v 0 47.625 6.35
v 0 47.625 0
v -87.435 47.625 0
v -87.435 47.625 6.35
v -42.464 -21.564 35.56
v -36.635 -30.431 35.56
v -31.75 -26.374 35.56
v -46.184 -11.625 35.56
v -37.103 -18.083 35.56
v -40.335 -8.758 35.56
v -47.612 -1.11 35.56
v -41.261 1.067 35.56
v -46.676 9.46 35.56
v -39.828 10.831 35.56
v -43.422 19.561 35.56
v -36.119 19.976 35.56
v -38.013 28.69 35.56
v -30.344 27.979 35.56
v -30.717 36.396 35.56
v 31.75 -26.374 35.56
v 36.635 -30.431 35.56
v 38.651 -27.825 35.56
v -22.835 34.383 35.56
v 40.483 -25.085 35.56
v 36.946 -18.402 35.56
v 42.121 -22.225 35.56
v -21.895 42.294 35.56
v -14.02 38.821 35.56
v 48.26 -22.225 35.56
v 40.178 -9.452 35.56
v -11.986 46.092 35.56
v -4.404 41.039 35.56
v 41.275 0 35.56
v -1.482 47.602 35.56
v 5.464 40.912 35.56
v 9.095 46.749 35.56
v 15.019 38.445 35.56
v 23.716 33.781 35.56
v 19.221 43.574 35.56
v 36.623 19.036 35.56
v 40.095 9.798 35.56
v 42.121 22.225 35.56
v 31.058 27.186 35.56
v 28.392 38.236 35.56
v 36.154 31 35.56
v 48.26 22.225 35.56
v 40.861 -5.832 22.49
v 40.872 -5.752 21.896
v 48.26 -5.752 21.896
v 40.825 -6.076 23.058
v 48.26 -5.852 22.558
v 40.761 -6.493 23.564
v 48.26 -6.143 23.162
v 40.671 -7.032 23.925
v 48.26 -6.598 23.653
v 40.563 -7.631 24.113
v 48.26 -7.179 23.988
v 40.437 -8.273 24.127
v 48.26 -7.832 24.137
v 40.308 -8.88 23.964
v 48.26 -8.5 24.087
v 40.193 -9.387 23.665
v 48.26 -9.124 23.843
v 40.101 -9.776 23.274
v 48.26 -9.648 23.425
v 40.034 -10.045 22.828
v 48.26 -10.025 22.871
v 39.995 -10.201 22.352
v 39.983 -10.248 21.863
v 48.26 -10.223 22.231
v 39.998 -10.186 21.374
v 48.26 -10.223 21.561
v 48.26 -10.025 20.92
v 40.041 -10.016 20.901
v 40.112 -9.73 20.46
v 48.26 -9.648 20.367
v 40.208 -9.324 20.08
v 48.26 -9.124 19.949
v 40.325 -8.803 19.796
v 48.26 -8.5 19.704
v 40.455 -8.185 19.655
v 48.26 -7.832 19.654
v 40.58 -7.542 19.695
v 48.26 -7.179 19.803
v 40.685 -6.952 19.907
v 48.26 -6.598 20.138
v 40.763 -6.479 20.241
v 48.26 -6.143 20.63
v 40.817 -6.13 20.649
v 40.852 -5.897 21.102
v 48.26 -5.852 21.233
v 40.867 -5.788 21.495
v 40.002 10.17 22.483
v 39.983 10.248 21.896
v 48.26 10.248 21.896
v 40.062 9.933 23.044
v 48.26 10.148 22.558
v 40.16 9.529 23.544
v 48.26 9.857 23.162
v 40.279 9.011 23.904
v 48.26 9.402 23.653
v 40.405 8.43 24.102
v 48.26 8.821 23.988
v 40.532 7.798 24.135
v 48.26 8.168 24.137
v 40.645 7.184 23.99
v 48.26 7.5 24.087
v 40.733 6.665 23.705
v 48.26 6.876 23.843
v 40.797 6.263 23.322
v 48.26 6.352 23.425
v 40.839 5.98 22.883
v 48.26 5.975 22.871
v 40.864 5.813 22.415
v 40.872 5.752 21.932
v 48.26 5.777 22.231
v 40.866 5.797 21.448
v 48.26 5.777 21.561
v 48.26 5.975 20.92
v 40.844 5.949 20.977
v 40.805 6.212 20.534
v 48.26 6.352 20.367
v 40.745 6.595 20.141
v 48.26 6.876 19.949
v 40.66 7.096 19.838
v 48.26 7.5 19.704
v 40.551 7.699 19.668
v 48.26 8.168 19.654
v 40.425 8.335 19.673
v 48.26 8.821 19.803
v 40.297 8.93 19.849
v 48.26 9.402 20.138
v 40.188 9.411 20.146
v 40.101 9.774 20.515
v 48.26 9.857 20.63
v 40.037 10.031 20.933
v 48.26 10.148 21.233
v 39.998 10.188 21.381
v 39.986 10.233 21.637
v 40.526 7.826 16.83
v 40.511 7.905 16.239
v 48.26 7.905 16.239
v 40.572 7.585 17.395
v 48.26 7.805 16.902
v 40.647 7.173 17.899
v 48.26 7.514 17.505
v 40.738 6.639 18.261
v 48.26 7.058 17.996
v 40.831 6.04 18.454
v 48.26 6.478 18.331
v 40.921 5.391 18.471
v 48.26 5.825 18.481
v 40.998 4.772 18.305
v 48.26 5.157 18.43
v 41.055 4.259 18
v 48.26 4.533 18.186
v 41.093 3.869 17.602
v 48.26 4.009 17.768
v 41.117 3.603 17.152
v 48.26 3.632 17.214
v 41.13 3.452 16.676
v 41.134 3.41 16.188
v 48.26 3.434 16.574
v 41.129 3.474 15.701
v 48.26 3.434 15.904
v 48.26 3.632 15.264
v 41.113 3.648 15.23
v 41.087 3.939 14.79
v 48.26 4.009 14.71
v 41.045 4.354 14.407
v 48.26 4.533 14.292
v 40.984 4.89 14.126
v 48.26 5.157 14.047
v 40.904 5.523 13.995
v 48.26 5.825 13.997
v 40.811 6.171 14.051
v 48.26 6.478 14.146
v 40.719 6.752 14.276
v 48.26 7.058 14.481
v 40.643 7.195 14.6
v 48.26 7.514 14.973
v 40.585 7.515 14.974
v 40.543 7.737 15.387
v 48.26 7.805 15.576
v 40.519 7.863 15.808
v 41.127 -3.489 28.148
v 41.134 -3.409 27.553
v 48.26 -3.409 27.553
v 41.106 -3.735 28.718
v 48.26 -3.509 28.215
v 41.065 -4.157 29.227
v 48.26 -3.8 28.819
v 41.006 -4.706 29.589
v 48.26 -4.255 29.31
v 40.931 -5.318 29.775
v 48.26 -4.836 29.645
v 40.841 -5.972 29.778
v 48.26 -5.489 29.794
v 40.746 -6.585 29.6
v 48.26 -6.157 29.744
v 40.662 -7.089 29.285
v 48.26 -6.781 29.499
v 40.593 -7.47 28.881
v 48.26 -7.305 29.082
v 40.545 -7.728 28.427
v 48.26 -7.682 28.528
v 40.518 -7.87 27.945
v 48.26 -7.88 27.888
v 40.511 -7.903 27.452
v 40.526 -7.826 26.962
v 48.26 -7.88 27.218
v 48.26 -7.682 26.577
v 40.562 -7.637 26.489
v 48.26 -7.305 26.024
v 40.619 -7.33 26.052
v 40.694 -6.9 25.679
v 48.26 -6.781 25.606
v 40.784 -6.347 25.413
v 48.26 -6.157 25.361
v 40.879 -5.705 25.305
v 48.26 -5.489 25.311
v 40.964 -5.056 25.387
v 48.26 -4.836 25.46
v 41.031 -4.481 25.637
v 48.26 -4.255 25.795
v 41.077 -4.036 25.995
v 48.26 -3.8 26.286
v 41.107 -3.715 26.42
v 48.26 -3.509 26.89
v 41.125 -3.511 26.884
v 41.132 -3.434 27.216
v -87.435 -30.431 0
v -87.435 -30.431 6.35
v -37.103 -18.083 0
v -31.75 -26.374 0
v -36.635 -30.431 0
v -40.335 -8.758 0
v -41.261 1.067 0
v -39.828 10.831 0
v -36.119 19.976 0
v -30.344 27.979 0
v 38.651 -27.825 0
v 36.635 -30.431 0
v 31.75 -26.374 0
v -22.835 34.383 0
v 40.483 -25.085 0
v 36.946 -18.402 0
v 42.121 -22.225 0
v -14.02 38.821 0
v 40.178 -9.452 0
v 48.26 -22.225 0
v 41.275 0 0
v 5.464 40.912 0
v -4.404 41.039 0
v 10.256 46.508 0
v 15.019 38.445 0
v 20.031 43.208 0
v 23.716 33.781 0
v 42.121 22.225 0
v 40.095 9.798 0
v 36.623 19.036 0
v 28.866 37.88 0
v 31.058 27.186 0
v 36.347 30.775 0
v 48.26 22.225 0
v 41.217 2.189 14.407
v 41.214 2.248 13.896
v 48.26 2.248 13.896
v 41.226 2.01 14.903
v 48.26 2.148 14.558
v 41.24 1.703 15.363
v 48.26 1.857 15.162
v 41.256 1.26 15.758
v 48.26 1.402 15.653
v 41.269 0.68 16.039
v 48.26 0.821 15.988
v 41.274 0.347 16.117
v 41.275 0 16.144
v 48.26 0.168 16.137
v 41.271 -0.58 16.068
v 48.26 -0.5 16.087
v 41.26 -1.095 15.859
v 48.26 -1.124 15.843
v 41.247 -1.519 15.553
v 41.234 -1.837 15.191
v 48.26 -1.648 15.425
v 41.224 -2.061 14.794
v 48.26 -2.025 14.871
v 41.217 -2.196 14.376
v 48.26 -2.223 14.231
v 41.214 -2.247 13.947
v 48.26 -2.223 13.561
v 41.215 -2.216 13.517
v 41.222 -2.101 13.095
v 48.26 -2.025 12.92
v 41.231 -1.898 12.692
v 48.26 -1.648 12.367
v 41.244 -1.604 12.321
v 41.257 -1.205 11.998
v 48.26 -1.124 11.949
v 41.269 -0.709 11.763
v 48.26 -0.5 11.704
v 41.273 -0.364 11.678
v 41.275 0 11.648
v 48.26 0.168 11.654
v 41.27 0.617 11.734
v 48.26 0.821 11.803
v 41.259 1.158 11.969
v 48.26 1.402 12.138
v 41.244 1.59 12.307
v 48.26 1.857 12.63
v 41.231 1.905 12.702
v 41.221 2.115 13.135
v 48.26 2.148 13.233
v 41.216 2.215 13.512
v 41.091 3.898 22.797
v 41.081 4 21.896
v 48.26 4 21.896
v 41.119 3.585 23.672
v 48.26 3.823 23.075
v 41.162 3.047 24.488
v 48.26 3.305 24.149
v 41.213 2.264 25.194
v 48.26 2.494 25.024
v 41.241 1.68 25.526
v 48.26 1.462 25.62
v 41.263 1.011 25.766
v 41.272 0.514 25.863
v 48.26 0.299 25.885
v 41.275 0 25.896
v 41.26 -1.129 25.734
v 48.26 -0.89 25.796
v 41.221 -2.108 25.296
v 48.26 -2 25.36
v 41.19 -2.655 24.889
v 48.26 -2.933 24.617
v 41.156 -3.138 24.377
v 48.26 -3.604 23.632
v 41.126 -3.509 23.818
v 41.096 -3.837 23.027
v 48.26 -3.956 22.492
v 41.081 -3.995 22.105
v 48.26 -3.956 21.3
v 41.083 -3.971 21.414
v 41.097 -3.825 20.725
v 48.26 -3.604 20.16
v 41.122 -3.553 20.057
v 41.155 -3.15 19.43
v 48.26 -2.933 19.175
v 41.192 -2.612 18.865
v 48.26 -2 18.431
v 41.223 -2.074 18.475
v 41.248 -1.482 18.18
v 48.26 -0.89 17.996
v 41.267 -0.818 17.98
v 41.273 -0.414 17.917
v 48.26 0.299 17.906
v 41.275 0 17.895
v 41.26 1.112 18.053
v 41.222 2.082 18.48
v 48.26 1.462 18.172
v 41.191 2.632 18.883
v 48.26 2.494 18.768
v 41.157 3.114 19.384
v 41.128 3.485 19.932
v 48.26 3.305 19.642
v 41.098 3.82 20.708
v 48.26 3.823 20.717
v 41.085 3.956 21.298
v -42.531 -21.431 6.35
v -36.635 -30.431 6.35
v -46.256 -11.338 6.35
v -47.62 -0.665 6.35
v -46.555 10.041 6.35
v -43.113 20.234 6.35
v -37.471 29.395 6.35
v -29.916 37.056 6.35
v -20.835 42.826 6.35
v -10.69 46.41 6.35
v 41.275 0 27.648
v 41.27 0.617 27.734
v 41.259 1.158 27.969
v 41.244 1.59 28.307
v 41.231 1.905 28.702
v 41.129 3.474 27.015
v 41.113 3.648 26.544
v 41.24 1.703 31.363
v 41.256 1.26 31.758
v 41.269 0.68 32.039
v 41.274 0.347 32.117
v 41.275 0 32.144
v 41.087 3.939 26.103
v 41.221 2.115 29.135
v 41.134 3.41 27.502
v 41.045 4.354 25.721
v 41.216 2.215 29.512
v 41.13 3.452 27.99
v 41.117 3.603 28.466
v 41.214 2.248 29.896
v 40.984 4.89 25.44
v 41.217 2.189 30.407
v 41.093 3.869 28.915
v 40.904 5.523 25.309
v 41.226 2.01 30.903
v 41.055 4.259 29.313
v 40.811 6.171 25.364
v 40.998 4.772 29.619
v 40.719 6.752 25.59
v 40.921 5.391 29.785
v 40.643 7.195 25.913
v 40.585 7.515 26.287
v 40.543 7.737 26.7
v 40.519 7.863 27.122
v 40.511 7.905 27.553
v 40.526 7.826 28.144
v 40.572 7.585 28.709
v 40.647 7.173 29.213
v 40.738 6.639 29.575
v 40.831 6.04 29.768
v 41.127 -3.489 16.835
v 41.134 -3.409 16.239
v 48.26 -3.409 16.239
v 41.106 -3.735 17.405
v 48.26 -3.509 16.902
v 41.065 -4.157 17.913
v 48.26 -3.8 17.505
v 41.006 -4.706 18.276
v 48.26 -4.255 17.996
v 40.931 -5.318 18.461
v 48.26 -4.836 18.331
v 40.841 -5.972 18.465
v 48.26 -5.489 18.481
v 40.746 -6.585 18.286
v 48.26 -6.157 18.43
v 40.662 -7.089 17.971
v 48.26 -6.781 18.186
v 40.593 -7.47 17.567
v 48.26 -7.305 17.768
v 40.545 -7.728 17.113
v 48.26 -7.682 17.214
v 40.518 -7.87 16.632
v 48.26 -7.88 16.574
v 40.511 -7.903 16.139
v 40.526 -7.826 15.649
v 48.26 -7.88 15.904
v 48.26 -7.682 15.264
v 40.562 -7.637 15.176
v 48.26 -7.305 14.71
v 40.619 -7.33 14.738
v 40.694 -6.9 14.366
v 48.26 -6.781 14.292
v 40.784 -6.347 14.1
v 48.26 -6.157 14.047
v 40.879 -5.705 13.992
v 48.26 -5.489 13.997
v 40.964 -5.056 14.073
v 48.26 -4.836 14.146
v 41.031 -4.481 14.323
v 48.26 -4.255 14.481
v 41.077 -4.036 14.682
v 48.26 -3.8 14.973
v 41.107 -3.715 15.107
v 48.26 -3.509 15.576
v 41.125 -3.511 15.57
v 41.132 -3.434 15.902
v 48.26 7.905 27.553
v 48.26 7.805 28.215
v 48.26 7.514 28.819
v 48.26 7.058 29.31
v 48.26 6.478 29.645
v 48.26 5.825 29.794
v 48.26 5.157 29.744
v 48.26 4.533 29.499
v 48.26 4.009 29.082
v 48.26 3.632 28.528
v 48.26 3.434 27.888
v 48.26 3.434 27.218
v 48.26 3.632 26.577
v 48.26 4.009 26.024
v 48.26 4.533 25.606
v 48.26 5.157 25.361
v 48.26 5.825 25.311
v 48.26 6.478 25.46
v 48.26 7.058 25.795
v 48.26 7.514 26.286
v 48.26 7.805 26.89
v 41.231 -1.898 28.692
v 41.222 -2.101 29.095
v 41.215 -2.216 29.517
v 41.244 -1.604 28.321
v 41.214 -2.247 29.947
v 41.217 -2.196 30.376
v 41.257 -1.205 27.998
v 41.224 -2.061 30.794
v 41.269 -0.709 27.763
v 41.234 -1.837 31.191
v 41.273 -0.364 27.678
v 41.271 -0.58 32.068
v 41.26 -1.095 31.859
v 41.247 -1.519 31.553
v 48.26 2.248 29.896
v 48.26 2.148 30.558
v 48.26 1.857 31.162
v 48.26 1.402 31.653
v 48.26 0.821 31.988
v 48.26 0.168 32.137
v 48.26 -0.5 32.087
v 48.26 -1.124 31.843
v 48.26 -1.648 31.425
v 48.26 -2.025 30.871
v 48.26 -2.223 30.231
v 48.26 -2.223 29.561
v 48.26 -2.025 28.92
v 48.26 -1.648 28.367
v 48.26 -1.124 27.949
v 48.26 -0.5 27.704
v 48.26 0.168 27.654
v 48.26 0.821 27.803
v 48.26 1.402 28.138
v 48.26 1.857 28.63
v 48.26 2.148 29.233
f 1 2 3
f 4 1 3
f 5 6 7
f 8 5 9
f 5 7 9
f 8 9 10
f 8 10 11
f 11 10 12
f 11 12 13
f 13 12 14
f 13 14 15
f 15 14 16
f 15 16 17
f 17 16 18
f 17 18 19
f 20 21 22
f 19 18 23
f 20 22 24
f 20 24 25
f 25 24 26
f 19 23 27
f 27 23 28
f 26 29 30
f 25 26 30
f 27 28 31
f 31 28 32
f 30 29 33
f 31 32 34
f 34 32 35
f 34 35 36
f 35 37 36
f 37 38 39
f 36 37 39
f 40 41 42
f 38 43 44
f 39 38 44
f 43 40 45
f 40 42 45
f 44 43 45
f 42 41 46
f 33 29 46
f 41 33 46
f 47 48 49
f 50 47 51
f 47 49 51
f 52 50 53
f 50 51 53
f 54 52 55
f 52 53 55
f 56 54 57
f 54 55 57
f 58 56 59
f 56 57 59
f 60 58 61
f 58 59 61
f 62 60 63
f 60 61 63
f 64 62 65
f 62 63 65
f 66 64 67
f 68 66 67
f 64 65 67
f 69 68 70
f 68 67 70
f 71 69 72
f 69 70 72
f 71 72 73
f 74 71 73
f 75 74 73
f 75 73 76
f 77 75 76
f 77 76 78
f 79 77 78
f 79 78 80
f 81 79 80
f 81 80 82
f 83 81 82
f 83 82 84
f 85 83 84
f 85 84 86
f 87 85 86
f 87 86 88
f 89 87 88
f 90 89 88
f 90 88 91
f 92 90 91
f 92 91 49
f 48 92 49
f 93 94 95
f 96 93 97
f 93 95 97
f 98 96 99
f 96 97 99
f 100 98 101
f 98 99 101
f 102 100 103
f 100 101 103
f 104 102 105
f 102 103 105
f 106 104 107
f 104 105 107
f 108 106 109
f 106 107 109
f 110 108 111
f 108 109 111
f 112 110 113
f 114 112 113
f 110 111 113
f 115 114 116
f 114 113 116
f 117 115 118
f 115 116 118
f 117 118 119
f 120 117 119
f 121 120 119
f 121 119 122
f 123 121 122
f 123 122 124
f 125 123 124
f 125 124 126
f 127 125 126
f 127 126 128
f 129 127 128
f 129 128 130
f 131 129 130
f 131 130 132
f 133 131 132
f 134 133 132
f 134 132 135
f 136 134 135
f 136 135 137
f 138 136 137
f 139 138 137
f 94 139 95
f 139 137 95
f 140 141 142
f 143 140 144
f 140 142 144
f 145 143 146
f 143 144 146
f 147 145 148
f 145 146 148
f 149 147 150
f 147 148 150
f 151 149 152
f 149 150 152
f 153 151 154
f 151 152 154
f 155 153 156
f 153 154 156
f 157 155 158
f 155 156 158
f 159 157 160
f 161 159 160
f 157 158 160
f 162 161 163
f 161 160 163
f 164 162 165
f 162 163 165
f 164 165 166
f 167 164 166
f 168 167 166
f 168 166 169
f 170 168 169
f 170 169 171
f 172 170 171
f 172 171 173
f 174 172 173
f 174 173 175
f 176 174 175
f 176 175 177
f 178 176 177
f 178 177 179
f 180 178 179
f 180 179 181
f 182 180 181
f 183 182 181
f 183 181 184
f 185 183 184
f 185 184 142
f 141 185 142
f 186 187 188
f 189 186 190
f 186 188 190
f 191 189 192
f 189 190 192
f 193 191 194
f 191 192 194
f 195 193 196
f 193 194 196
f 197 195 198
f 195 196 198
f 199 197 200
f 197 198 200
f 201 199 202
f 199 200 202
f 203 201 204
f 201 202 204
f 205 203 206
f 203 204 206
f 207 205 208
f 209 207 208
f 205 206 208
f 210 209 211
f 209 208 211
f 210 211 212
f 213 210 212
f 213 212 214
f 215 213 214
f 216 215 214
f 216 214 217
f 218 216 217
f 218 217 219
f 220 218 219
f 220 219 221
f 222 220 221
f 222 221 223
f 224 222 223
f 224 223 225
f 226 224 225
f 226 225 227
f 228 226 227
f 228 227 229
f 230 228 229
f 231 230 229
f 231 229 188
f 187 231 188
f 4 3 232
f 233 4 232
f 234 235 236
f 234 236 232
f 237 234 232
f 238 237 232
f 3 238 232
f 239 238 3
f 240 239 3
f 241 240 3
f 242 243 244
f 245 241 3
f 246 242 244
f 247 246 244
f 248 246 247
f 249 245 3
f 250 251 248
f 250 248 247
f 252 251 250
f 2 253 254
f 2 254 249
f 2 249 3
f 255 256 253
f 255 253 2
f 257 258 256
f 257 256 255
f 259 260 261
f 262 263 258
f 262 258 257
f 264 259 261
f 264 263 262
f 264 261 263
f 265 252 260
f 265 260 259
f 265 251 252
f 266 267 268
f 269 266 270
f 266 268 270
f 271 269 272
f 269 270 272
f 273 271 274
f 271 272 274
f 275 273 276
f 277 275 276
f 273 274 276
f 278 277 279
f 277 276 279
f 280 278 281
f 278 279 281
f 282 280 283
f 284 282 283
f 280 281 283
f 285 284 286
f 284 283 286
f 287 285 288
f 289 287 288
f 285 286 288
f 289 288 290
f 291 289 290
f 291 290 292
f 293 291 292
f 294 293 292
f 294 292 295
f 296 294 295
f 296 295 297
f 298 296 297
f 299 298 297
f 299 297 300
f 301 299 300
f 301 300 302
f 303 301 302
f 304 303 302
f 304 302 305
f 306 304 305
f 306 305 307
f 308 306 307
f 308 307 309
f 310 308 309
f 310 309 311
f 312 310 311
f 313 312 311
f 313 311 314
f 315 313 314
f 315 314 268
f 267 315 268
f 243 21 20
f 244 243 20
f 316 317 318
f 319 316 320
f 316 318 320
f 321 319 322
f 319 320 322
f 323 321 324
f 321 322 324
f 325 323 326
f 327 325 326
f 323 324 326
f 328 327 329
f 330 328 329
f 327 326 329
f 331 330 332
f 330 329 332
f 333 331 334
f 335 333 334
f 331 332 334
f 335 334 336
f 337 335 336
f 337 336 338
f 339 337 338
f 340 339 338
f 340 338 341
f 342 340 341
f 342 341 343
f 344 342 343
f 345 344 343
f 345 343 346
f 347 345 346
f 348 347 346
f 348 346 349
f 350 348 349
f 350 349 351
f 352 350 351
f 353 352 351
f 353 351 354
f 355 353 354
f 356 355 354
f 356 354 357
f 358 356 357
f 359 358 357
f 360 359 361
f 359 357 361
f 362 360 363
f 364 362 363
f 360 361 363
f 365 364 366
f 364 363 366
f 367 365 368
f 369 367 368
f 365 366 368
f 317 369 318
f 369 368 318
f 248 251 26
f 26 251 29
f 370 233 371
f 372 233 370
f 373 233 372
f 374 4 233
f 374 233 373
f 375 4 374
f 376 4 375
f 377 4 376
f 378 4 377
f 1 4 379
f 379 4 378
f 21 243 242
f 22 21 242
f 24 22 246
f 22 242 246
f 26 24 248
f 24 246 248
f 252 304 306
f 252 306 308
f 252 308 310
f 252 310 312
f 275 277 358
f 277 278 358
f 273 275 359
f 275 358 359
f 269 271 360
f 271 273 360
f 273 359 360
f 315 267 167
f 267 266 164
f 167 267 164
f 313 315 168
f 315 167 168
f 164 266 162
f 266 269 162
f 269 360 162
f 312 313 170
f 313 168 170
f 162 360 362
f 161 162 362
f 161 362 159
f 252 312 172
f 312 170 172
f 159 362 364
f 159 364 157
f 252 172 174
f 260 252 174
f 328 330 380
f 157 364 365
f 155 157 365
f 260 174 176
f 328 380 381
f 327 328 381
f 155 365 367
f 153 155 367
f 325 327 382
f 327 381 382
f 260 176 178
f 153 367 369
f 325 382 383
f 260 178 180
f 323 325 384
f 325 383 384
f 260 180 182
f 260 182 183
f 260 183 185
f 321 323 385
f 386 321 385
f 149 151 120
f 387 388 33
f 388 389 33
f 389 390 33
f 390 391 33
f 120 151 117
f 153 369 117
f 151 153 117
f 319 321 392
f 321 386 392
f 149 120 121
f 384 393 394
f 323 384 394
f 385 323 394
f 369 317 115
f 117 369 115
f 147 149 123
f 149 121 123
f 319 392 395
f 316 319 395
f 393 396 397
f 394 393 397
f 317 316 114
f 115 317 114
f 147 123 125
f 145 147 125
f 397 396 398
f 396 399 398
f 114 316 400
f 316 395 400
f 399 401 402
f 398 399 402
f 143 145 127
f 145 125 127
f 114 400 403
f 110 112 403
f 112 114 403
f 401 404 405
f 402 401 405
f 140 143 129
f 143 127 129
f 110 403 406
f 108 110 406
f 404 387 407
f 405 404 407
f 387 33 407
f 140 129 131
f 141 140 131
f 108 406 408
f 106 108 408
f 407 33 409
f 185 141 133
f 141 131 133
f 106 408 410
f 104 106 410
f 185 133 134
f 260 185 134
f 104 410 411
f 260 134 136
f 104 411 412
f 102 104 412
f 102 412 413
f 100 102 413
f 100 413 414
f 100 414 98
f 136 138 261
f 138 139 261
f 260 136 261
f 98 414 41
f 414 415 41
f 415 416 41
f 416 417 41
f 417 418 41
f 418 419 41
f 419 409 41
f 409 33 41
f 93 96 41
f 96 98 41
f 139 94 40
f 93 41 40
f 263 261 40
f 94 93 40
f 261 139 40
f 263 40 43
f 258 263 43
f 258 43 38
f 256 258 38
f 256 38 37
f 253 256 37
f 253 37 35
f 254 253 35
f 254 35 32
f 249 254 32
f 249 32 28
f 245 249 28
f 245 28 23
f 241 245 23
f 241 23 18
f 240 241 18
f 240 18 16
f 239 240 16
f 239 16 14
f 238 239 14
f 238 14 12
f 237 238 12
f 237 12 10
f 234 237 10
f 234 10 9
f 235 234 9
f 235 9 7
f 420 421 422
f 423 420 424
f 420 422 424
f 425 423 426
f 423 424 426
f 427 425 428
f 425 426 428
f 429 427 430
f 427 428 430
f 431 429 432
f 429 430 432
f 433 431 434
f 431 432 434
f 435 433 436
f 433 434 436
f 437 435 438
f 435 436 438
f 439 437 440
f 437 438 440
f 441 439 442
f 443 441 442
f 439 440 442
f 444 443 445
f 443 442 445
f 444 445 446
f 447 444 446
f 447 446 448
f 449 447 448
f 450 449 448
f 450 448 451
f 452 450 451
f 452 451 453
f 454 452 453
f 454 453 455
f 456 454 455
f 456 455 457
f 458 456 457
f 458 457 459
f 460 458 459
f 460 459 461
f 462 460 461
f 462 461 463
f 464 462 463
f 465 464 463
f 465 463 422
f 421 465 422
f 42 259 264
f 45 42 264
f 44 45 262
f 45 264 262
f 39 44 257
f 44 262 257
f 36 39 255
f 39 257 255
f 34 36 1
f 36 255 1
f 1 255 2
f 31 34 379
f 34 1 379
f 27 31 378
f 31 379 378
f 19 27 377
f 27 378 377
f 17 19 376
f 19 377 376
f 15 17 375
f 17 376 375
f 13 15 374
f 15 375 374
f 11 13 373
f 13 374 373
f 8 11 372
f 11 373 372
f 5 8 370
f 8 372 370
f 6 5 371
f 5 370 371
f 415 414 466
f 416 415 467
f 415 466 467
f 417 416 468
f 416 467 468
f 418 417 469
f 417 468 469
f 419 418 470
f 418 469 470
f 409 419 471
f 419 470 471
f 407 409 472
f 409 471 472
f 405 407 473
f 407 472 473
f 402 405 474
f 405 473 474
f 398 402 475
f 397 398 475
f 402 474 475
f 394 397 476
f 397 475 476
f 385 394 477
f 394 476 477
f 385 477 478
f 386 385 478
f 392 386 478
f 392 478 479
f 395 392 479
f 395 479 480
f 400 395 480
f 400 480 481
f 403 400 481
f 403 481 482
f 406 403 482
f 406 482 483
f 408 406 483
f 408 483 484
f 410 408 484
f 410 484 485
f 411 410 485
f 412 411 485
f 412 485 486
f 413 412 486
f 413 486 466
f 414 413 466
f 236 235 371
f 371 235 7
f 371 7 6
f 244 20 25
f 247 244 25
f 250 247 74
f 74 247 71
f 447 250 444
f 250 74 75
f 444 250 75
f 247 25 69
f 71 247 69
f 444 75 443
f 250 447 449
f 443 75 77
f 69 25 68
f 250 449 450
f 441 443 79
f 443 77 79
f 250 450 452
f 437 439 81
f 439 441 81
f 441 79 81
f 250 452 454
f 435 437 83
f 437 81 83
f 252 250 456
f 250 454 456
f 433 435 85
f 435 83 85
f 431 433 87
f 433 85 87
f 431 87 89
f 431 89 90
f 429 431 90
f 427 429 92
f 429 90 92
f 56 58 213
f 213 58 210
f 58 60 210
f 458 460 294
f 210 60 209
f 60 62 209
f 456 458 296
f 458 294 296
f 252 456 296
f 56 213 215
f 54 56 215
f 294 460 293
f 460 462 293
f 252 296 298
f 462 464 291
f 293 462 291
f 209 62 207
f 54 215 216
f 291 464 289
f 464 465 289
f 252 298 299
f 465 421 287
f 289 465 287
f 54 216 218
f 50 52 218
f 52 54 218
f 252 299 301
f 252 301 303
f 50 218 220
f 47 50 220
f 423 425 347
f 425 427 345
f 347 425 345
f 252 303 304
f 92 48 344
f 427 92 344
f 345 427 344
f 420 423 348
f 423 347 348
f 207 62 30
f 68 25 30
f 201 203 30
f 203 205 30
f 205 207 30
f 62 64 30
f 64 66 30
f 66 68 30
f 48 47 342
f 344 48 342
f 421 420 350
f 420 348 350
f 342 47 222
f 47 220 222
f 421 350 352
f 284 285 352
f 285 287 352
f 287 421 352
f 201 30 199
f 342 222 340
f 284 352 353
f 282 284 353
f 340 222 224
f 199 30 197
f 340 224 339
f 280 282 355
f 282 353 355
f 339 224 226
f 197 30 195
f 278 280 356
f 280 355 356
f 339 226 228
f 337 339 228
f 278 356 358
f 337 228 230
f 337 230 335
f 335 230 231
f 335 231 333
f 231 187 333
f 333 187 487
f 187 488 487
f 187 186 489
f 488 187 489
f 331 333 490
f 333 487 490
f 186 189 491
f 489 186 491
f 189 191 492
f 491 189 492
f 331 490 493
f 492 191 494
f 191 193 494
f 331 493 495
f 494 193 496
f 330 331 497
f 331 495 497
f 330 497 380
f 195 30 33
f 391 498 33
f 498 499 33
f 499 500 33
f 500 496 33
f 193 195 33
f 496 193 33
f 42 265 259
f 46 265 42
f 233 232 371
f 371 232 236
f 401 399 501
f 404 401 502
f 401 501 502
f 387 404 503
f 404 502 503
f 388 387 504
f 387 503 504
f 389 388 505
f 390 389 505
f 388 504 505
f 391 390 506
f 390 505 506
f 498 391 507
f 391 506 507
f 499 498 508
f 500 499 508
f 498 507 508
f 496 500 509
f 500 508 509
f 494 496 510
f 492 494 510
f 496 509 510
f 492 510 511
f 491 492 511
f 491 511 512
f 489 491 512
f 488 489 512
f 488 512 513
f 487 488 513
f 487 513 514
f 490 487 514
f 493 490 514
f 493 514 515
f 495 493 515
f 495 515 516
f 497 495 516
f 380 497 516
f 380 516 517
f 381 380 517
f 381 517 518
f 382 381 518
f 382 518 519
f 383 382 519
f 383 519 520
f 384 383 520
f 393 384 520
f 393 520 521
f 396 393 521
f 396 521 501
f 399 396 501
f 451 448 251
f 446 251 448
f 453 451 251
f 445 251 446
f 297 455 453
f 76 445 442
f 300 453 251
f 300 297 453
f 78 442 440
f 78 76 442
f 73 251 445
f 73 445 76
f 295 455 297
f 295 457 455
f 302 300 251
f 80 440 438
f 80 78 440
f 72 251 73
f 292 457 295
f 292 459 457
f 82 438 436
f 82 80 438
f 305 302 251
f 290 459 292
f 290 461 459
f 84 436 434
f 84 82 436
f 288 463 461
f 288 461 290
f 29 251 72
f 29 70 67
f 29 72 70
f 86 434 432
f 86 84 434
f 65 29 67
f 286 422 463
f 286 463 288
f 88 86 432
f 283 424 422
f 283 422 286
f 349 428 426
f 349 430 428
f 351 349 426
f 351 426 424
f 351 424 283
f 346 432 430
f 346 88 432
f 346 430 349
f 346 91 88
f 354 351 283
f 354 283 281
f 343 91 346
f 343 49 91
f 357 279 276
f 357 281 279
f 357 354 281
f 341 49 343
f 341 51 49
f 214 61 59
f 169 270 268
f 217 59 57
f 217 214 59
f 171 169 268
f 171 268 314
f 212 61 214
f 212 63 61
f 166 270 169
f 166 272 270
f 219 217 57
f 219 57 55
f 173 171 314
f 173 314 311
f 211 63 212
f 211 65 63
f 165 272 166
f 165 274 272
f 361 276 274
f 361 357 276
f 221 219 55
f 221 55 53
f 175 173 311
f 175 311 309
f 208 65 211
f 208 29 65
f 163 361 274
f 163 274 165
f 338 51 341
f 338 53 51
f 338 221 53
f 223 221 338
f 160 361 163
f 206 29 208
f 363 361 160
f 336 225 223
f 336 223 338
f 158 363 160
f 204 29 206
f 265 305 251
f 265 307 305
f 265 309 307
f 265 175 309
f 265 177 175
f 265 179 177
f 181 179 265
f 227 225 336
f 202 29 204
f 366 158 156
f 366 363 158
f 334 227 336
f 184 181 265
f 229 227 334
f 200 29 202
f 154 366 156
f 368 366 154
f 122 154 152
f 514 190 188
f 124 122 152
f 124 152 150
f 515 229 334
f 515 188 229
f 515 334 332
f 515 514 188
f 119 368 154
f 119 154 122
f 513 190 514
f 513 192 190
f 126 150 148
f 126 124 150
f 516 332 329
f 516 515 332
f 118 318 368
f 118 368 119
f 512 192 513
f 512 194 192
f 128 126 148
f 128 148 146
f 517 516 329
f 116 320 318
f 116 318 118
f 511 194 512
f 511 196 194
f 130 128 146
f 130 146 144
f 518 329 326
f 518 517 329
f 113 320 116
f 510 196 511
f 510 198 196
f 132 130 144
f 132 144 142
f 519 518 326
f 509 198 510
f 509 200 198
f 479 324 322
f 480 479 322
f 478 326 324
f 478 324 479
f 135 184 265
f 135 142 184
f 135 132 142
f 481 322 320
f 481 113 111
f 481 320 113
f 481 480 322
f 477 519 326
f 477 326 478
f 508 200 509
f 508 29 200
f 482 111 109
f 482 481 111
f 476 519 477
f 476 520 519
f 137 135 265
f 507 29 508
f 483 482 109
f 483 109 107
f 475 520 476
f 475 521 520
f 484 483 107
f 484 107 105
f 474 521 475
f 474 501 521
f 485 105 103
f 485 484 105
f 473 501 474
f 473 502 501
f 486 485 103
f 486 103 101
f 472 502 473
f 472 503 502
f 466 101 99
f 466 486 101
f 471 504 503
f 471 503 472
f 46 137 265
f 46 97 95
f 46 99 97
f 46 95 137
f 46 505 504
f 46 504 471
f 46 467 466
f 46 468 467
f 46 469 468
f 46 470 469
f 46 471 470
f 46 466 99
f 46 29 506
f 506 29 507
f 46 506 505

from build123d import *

# Parameters (mm, degrees)
F0_R      = 47.625
F1_DEPTH  = 35.56
F2_R      = 41.275
F3_DEPTH  = 35.561
F5_W      = 44.45
F5_H      = 35.56
F7_R      = 2.2479
F7_R_2    = 4.0005
F8_DEPTH  = 8.2784267637
F10_DEPTH = 35.5610001
F12_DEPTH = 6.35


with BuildPart() as f1:
    # F0 (on Top) → F1 (new body)
    with BuildSketch(Plane.XY):
        Circle(F0_R)
    extrude(amount=F1_DEPTH)

    # F2 (on face) → F3 (cut, through all)
    with BuildSketch(Plane.XY.offset(35.56)):
        Circle(F2_R)
    extrude(amount=-F3_DEPTH, mode=Mode.SUBTRACT)

    # F5 (on offset) → F6 (join, up to the next surface of F1)
    with BuildSketch(Plane.YZ.offset(48.26)):
        with Locations((0, 17.78)):
            Rectangle(F5_W, F5_H)
    extrude(until=Until.NEXT, dir=(-1, 0, 0))

    # F7 (on face) → F8 (cut, through all)
    with BuildSketch(Plane.YZ.offset(48.26)):
        with Locations((0, 29.8958)):
            Circle(F7_R)
        with Locations((-5.6568542495, 27.5526542495)):
            Circle(F7_R)
        with Locations((-8, 21.8958)):
            Circle(F7_R)
        with Locations((-5.6568542495, 16.2389457505)):
            Circle(F7_R)
        with Locations((0, 13.8958)):
            Circle(F7_R)
        with Locations((5.6568542495, 16.2389457505)):
            Circle(F7_R)
        with Locations((8, 21.8958)):
            Circle(F7_R)
        with Locations((5.6568542495, 27.5526542495)):
            Circle(F7_R)
        with Locations((0, 21.8958)):
            Circle(F7_R_2)
    extrude(amount=-F8_DEPTH, mode=Mode.SUBTRACT)

    # F9 (on face) → F10 (cut, through all)
    with BuildSketch(Plane.XY.offset(35.56)):
        Polygon((31.75, -26.3735307648), (-31.75, -26.3735307648), (-65.0275838732, -54.0159679949), (65.0275838732, -54.0159679949), align=None)
    extrude(amount=-F10_DEPTH, mode=Mode.SUBTRACT)

    # F11 (on Top) → F12 (join)
    with BuildSketch(Plane.XY):
        with BuildLine():
            Line((-36.6346153846, -30.4309970363), (-31.75, -26.3735307648))
            ThreePointArc((-31.75, -26.3735307648), (-37.3643754619, 17.536506817), (0, 41.275))
            Line((0, 41.275), (0, 47.625))
            Line((0, 47.625), (-87.4346153846, 47.625))
            Line((-87.4346153846, 47.625), (-87.4346153846, -30.4309970363))
            Line((-87.4346153846, -30.4309970363), (-36.6346153846, -30.4309970363))
        make_face()
    extrude(amount=F12_DEPTH)


solid = f1.part
